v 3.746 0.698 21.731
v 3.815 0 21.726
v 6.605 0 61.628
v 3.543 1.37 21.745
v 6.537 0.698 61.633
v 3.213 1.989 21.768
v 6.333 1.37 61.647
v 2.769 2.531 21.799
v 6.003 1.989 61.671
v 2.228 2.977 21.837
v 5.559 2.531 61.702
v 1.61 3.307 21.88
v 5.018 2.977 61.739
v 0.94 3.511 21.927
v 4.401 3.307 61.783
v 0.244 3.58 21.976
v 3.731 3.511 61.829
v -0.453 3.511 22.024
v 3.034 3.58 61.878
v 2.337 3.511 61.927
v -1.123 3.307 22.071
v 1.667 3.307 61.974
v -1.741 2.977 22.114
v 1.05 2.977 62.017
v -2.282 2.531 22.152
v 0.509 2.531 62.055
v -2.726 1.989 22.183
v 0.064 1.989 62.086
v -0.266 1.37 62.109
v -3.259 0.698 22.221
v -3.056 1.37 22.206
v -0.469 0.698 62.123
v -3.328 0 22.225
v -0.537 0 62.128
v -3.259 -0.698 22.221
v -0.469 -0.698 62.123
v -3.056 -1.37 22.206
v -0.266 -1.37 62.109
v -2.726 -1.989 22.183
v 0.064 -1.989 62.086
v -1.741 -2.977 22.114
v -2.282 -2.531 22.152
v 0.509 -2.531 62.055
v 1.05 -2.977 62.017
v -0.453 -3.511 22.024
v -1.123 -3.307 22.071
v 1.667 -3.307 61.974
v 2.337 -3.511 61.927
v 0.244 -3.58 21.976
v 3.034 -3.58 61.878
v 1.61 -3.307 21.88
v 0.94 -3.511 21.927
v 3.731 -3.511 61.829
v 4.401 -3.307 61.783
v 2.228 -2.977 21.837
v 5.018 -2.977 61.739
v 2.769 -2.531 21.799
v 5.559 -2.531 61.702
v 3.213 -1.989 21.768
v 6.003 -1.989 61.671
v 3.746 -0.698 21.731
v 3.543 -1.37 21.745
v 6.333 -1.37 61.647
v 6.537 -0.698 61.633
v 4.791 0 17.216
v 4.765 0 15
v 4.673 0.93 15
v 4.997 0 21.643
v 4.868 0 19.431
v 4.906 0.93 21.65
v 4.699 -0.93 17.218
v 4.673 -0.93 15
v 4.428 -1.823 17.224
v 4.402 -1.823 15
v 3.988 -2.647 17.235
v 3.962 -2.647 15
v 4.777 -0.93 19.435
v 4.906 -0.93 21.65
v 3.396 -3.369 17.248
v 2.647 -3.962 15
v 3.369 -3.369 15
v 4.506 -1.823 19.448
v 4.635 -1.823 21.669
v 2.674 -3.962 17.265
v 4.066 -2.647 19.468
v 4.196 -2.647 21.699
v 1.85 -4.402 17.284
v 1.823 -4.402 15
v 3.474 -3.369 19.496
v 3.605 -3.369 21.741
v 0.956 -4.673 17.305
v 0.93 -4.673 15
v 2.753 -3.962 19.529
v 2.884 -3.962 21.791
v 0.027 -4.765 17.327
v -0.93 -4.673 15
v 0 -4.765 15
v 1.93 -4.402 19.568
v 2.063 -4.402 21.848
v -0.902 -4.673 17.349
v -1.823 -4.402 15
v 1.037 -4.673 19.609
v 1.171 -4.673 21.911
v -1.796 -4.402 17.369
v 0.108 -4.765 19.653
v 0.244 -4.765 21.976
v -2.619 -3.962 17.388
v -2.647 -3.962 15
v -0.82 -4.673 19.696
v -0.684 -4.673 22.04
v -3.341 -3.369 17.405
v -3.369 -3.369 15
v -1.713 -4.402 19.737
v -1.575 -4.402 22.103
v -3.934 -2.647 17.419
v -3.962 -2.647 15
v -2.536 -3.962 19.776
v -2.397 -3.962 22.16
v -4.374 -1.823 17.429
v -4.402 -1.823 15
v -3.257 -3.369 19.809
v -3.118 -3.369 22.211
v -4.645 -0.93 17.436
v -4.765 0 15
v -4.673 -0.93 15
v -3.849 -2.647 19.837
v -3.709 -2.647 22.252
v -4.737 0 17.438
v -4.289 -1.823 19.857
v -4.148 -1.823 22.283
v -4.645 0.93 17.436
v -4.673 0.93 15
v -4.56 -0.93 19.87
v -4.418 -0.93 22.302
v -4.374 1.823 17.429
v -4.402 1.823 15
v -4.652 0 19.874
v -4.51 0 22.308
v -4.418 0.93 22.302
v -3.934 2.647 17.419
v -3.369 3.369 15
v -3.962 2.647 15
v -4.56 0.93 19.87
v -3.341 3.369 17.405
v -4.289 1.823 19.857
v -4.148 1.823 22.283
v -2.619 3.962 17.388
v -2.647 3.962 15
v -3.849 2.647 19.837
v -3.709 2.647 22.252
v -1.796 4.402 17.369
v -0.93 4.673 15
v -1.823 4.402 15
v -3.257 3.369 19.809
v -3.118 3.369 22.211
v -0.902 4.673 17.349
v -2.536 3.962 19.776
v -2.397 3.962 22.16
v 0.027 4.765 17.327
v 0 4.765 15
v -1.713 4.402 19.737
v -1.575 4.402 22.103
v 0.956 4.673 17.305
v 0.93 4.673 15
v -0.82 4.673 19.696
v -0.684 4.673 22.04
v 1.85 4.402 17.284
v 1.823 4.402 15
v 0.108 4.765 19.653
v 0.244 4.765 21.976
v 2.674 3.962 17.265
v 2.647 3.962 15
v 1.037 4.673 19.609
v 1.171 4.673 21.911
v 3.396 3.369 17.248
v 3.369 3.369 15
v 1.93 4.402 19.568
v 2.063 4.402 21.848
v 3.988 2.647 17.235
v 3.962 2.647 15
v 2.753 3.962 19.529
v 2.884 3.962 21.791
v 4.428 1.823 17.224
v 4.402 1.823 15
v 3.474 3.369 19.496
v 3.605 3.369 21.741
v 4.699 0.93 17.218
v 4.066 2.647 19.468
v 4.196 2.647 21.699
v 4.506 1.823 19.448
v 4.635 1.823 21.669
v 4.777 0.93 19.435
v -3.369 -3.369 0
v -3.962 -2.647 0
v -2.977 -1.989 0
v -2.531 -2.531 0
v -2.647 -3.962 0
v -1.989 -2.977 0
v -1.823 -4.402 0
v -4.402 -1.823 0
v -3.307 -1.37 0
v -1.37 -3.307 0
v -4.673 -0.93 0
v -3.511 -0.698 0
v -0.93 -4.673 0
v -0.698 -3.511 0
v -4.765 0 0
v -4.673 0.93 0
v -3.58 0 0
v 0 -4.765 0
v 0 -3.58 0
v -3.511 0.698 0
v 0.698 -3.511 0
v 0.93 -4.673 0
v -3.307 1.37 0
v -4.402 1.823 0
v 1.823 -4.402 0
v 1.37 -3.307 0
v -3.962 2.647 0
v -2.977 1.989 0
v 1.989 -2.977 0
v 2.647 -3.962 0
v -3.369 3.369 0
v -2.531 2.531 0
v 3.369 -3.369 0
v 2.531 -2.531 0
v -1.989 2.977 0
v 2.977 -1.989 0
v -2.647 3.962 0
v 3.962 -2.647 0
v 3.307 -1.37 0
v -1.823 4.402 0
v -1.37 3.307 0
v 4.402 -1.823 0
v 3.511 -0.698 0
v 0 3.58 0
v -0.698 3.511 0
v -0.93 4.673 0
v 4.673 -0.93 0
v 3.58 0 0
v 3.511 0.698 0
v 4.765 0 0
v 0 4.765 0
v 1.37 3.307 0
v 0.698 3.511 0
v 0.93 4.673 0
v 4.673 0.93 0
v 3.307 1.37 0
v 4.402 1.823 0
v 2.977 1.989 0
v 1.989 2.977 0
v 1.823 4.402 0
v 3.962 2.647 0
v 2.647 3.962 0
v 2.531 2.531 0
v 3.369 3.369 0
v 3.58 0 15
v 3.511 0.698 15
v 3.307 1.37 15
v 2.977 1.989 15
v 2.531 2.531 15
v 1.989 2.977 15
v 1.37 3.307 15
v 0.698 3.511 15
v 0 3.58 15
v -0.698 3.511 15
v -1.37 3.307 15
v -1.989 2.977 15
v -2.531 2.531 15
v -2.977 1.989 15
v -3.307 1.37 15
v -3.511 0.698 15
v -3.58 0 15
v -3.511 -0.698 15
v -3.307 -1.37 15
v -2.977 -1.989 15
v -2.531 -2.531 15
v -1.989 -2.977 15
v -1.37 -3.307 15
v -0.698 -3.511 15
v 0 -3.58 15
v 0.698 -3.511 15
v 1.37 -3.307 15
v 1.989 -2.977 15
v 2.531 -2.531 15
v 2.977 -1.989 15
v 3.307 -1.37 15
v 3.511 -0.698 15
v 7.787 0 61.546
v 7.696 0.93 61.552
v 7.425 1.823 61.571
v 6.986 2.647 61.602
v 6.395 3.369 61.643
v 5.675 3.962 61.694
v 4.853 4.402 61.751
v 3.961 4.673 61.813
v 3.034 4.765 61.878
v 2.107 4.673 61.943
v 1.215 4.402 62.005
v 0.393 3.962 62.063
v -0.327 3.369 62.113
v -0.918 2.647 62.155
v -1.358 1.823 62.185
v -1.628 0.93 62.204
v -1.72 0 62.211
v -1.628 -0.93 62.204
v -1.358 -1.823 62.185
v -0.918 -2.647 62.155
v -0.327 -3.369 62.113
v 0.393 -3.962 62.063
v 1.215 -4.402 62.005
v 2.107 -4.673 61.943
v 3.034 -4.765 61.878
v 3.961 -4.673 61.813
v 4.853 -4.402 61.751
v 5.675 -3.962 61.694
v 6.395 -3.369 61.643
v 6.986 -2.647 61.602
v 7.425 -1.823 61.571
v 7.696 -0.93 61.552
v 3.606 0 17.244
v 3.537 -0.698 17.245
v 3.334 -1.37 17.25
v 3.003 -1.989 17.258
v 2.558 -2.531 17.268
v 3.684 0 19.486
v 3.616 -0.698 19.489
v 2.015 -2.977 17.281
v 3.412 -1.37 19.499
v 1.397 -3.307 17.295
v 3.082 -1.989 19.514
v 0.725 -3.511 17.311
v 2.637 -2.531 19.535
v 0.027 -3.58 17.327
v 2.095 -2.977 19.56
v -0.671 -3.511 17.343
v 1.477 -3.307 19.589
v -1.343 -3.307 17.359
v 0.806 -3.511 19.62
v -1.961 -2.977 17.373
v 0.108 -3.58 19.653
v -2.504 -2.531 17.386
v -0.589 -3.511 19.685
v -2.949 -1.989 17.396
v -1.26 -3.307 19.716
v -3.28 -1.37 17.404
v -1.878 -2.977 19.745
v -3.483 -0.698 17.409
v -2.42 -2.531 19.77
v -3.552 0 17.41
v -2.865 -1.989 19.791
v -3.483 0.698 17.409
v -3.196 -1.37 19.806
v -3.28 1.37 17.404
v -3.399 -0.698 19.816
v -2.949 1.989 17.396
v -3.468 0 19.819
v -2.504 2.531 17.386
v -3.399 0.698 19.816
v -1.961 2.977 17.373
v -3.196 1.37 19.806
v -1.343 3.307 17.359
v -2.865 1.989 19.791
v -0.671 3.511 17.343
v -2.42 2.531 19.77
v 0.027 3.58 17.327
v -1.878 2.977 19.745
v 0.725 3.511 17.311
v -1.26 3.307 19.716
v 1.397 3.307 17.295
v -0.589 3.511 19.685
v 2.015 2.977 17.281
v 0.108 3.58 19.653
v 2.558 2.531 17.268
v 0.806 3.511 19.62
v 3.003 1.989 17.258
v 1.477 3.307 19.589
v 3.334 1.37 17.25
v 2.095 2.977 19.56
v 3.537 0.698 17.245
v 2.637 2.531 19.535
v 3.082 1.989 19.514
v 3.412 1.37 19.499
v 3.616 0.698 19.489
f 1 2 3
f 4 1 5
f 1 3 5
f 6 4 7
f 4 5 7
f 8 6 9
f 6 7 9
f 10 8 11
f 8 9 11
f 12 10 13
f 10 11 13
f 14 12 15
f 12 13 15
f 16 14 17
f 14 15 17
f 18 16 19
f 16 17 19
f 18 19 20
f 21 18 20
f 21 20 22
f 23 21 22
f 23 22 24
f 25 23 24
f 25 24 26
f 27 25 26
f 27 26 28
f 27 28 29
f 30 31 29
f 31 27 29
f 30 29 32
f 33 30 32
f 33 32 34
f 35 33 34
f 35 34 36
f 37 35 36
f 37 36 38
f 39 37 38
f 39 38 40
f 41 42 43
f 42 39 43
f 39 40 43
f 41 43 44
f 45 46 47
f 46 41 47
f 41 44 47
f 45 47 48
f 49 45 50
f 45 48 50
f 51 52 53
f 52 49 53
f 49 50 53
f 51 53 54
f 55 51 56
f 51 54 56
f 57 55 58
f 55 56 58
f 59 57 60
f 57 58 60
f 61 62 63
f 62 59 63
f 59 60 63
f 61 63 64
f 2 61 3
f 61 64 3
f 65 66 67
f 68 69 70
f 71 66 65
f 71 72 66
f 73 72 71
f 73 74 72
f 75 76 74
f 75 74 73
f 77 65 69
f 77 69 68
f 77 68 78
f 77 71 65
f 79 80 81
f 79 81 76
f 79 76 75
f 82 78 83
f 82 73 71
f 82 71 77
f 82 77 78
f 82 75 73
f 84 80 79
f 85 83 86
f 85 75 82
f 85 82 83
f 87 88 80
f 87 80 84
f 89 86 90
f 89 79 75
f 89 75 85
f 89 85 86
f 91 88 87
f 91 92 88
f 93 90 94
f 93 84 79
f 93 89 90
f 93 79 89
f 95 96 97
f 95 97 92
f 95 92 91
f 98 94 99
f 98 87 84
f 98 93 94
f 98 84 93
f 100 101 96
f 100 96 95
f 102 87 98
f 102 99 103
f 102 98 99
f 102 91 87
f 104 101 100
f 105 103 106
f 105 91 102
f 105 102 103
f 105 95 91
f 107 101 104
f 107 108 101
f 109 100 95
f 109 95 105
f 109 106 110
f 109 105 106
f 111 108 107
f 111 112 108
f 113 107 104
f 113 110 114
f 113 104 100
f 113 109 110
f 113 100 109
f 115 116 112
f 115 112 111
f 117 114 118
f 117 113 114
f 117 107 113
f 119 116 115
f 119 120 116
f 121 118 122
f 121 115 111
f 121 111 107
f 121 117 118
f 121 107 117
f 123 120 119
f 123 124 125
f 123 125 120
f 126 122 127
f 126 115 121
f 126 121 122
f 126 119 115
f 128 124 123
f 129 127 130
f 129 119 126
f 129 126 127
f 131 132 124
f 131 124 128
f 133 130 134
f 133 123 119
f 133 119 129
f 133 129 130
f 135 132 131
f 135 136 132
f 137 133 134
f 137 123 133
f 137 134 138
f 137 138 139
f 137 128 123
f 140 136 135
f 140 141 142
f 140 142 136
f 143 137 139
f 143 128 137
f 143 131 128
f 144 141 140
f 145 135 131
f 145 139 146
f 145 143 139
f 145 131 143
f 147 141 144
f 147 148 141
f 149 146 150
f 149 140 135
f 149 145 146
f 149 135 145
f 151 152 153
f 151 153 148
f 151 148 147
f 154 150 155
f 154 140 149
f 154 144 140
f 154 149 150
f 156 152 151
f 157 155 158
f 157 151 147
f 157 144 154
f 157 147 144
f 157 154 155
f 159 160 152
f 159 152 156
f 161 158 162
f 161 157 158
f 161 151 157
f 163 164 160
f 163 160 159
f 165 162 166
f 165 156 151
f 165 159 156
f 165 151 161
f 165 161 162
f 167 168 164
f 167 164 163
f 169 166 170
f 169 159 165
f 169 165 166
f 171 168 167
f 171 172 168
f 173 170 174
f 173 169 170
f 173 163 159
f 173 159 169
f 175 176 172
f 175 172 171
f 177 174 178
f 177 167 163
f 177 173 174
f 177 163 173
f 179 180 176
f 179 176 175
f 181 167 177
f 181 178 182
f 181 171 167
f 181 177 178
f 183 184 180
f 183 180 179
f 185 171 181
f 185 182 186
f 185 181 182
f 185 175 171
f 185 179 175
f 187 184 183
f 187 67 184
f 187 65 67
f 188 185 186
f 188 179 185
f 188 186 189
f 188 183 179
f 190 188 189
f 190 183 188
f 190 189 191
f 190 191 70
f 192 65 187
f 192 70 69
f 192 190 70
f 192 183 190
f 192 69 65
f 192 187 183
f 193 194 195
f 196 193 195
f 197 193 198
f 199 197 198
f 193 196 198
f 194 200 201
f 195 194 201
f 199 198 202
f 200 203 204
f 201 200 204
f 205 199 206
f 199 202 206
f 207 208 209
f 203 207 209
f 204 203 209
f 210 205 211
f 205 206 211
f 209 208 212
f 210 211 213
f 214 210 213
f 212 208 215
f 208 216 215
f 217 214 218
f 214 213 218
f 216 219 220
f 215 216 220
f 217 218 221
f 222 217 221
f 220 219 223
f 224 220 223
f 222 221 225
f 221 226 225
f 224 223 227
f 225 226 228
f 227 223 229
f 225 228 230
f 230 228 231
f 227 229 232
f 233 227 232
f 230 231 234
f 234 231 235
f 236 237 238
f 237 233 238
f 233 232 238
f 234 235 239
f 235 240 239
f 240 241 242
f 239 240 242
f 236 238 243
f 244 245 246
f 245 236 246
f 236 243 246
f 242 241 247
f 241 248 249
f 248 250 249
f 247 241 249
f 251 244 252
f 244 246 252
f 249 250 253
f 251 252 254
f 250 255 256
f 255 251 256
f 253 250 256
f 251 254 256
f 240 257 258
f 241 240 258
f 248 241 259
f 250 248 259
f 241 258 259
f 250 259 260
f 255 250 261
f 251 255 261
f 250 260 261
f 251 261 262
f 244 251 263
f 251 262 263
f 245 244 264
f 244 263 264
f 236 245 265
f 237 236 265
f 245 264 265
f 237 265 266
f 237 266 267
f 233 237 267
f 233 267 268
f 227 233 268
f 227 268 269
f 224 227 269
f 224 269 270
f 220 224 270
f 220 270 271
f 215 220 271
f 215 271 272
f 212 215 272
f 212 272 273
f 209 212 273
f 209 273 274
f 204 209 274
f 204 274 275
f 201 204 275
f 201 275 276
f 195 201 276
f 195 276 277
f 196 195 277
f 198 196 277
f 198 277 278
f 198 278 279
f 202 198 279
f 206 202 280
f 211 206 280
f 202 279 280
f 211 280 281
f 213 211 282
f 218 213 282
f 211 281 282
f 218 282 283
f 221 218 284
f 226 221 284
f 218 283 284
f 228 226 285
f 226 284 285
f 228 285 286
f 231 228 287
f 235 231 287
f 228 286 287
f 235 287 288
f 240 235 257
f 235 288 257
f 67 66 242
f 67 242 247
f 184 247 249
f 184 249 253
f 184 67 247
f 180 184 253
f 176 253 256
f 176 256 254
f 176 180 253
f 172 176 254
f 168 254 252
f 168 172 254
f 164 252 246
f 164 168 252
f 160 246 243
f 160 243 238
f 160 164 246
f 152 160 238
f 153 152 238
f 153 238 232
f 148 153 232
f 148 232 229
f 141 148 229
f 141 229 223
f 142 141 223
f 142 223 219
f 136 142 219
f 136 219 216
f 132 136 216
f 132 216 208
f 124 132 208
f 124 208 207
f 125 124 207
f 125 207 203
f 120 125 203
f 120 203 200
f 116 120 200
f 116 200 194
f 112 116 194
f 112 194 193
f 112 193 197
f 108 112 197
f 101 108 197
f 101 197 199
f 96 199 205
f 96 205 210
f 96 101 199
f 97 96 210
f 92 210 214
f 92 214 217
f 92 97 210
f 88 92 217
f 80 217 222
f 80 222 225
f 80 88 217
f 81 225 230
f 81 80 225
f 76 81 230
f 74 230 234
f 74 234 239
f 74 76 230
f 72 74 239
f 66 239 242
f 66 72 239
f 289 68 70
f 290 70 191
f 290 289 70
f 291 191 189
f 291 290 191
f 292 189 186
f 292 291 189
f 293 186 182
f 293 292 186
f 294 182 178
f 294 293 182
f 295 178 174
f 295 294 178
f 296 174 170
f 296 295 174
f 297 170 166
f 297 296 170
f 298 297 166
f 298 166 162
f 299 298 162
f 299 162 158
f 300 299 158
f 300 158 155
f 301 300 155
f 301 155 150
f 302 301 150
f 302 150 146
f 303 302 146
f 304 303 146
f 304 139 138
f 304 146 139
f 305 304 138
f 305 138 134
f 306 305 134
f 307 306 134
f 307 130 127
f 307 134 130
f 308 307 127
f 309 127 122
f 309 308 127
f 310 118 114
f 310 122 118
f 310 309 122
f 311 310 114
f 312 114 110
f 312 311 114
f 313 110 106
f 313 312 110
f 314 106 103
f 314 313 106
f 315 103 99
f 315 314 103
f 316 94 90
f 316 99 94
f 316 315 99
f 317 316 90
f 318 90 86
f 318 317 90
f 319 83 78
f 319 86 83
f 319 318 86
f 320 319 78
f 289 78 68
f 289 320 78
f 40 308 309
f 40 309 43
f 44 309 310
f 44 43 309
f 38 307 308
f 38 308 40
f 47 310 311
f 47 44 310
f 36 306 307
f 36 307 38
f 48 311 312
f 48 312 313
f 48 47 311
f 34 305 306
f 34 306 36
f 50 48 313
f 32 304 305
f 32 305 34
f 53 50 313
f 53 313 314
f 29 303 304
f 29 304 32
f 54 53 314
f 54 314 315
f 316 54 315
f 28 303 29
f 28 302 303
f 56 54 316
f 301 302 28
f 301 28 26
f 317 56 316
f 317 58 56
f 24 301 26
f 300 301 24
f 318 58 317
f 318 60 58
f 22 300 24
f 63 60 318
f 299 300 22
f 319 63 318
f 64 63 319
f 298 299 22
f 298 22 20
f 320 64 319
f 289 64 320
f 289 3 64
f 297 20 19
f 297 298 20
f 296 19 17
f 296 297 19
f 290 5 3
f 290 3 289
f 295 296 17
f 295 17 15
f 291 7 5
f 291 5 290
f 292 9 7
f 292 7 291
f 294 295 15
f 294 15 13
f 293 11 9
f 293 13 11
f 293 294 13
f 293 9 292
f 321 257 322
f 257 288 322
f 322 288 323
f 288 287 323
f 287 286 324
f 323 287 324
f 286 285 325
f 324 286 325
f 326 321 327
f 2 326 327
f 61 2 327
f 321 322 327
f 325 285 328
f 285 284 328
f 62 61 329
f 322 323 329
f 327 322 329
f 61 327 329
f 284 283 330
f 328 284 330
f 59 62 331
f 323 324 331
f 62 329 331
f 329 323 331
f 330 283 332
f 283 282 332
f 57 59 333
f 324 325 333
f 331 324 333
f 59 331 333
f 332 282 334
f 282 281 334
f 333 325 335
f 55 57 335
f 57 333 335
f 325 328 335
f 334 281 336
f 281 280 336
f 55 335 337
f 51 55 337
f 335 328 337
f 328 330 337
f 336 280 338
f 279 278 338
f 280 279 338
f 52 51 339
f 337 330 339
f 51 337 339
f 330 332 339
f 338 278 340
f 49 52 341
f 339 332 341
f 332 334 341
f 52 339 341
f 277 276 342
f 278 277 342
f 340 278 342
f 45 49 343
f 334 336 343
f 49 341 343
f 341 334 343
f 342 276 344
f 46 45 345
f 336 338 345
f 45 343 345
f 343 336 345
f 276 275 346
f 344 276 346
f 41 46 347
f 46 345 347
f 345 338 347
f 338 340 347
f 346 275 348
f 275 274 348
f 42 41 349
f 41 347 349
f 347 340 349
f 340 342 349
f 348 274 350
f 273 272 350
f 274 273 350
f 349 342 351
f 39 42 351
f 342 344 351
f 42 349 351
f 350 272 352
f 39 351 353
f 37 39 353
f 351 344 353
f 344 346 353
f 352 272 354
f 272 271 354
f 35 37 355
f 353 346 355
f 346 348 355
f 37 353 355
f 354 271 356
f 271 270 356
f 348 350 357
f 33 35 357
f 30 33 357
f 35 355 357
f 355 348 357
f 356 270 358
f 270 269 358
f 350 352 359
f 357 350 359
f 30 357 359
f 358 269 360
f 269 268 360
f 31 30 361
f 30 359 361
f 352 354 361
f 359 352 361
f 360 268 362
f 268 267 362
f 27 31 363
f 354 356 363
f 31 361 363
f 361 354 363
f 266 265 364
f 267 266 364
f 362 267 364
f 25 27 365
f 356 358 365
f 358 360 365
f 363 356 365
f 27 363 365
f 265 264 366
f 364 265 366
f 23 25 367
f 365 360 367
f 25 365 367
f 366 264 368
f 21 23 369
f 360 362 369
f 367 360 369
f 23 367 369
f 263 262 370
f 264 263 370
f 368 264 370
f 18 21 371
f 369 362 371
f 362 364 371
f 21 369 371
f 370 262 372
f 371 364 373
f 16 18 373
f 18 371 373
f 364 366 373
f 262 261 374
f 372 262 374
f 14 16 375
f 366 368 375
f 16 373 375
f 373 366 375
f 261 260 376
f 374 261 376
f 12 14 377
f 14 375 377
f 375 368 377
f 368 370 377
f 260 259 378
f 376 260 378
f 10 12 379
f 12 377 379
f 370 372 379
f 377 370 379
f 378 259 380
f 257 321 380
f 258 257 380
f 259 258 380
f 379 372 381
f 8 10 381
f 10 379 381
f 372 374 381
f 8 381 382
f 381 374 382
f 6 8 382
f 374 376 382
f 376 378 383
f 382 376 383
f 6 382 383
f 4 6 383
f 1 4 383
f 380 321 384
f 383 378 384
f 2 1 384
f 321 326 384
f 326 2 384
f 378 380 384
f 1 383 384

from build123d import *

# Parameters (mm, degrees)
SKETCH_1_R   = 4.765
SKETCH_1_R_2 = 3.58


with BuildPart() as part:
    # По траектории1: sweep along a curve in space
    with BuildLine() as sweep_1_path:
        Line((0, 0, 0), (0, 0, 15))
        ThreePointArc((0, 0, 15), (0.060917298, 0, 18.48994967), (0.243594974, 0, 21.975647374))
        Line((0.243594974, 0, 21.975647374), (3.033853924, 0, 61.878209385))
    # Эскиз1 → По траектории1 (sweep)
    with BuildSketch(Plane.XY):
        Circle(SKETCH_1_R)
        Circle(SKETCH_1_R_2, mode=Mode.SUBTRACT)
    sweep(path=sweep_1_path.line)


solid = part.part
